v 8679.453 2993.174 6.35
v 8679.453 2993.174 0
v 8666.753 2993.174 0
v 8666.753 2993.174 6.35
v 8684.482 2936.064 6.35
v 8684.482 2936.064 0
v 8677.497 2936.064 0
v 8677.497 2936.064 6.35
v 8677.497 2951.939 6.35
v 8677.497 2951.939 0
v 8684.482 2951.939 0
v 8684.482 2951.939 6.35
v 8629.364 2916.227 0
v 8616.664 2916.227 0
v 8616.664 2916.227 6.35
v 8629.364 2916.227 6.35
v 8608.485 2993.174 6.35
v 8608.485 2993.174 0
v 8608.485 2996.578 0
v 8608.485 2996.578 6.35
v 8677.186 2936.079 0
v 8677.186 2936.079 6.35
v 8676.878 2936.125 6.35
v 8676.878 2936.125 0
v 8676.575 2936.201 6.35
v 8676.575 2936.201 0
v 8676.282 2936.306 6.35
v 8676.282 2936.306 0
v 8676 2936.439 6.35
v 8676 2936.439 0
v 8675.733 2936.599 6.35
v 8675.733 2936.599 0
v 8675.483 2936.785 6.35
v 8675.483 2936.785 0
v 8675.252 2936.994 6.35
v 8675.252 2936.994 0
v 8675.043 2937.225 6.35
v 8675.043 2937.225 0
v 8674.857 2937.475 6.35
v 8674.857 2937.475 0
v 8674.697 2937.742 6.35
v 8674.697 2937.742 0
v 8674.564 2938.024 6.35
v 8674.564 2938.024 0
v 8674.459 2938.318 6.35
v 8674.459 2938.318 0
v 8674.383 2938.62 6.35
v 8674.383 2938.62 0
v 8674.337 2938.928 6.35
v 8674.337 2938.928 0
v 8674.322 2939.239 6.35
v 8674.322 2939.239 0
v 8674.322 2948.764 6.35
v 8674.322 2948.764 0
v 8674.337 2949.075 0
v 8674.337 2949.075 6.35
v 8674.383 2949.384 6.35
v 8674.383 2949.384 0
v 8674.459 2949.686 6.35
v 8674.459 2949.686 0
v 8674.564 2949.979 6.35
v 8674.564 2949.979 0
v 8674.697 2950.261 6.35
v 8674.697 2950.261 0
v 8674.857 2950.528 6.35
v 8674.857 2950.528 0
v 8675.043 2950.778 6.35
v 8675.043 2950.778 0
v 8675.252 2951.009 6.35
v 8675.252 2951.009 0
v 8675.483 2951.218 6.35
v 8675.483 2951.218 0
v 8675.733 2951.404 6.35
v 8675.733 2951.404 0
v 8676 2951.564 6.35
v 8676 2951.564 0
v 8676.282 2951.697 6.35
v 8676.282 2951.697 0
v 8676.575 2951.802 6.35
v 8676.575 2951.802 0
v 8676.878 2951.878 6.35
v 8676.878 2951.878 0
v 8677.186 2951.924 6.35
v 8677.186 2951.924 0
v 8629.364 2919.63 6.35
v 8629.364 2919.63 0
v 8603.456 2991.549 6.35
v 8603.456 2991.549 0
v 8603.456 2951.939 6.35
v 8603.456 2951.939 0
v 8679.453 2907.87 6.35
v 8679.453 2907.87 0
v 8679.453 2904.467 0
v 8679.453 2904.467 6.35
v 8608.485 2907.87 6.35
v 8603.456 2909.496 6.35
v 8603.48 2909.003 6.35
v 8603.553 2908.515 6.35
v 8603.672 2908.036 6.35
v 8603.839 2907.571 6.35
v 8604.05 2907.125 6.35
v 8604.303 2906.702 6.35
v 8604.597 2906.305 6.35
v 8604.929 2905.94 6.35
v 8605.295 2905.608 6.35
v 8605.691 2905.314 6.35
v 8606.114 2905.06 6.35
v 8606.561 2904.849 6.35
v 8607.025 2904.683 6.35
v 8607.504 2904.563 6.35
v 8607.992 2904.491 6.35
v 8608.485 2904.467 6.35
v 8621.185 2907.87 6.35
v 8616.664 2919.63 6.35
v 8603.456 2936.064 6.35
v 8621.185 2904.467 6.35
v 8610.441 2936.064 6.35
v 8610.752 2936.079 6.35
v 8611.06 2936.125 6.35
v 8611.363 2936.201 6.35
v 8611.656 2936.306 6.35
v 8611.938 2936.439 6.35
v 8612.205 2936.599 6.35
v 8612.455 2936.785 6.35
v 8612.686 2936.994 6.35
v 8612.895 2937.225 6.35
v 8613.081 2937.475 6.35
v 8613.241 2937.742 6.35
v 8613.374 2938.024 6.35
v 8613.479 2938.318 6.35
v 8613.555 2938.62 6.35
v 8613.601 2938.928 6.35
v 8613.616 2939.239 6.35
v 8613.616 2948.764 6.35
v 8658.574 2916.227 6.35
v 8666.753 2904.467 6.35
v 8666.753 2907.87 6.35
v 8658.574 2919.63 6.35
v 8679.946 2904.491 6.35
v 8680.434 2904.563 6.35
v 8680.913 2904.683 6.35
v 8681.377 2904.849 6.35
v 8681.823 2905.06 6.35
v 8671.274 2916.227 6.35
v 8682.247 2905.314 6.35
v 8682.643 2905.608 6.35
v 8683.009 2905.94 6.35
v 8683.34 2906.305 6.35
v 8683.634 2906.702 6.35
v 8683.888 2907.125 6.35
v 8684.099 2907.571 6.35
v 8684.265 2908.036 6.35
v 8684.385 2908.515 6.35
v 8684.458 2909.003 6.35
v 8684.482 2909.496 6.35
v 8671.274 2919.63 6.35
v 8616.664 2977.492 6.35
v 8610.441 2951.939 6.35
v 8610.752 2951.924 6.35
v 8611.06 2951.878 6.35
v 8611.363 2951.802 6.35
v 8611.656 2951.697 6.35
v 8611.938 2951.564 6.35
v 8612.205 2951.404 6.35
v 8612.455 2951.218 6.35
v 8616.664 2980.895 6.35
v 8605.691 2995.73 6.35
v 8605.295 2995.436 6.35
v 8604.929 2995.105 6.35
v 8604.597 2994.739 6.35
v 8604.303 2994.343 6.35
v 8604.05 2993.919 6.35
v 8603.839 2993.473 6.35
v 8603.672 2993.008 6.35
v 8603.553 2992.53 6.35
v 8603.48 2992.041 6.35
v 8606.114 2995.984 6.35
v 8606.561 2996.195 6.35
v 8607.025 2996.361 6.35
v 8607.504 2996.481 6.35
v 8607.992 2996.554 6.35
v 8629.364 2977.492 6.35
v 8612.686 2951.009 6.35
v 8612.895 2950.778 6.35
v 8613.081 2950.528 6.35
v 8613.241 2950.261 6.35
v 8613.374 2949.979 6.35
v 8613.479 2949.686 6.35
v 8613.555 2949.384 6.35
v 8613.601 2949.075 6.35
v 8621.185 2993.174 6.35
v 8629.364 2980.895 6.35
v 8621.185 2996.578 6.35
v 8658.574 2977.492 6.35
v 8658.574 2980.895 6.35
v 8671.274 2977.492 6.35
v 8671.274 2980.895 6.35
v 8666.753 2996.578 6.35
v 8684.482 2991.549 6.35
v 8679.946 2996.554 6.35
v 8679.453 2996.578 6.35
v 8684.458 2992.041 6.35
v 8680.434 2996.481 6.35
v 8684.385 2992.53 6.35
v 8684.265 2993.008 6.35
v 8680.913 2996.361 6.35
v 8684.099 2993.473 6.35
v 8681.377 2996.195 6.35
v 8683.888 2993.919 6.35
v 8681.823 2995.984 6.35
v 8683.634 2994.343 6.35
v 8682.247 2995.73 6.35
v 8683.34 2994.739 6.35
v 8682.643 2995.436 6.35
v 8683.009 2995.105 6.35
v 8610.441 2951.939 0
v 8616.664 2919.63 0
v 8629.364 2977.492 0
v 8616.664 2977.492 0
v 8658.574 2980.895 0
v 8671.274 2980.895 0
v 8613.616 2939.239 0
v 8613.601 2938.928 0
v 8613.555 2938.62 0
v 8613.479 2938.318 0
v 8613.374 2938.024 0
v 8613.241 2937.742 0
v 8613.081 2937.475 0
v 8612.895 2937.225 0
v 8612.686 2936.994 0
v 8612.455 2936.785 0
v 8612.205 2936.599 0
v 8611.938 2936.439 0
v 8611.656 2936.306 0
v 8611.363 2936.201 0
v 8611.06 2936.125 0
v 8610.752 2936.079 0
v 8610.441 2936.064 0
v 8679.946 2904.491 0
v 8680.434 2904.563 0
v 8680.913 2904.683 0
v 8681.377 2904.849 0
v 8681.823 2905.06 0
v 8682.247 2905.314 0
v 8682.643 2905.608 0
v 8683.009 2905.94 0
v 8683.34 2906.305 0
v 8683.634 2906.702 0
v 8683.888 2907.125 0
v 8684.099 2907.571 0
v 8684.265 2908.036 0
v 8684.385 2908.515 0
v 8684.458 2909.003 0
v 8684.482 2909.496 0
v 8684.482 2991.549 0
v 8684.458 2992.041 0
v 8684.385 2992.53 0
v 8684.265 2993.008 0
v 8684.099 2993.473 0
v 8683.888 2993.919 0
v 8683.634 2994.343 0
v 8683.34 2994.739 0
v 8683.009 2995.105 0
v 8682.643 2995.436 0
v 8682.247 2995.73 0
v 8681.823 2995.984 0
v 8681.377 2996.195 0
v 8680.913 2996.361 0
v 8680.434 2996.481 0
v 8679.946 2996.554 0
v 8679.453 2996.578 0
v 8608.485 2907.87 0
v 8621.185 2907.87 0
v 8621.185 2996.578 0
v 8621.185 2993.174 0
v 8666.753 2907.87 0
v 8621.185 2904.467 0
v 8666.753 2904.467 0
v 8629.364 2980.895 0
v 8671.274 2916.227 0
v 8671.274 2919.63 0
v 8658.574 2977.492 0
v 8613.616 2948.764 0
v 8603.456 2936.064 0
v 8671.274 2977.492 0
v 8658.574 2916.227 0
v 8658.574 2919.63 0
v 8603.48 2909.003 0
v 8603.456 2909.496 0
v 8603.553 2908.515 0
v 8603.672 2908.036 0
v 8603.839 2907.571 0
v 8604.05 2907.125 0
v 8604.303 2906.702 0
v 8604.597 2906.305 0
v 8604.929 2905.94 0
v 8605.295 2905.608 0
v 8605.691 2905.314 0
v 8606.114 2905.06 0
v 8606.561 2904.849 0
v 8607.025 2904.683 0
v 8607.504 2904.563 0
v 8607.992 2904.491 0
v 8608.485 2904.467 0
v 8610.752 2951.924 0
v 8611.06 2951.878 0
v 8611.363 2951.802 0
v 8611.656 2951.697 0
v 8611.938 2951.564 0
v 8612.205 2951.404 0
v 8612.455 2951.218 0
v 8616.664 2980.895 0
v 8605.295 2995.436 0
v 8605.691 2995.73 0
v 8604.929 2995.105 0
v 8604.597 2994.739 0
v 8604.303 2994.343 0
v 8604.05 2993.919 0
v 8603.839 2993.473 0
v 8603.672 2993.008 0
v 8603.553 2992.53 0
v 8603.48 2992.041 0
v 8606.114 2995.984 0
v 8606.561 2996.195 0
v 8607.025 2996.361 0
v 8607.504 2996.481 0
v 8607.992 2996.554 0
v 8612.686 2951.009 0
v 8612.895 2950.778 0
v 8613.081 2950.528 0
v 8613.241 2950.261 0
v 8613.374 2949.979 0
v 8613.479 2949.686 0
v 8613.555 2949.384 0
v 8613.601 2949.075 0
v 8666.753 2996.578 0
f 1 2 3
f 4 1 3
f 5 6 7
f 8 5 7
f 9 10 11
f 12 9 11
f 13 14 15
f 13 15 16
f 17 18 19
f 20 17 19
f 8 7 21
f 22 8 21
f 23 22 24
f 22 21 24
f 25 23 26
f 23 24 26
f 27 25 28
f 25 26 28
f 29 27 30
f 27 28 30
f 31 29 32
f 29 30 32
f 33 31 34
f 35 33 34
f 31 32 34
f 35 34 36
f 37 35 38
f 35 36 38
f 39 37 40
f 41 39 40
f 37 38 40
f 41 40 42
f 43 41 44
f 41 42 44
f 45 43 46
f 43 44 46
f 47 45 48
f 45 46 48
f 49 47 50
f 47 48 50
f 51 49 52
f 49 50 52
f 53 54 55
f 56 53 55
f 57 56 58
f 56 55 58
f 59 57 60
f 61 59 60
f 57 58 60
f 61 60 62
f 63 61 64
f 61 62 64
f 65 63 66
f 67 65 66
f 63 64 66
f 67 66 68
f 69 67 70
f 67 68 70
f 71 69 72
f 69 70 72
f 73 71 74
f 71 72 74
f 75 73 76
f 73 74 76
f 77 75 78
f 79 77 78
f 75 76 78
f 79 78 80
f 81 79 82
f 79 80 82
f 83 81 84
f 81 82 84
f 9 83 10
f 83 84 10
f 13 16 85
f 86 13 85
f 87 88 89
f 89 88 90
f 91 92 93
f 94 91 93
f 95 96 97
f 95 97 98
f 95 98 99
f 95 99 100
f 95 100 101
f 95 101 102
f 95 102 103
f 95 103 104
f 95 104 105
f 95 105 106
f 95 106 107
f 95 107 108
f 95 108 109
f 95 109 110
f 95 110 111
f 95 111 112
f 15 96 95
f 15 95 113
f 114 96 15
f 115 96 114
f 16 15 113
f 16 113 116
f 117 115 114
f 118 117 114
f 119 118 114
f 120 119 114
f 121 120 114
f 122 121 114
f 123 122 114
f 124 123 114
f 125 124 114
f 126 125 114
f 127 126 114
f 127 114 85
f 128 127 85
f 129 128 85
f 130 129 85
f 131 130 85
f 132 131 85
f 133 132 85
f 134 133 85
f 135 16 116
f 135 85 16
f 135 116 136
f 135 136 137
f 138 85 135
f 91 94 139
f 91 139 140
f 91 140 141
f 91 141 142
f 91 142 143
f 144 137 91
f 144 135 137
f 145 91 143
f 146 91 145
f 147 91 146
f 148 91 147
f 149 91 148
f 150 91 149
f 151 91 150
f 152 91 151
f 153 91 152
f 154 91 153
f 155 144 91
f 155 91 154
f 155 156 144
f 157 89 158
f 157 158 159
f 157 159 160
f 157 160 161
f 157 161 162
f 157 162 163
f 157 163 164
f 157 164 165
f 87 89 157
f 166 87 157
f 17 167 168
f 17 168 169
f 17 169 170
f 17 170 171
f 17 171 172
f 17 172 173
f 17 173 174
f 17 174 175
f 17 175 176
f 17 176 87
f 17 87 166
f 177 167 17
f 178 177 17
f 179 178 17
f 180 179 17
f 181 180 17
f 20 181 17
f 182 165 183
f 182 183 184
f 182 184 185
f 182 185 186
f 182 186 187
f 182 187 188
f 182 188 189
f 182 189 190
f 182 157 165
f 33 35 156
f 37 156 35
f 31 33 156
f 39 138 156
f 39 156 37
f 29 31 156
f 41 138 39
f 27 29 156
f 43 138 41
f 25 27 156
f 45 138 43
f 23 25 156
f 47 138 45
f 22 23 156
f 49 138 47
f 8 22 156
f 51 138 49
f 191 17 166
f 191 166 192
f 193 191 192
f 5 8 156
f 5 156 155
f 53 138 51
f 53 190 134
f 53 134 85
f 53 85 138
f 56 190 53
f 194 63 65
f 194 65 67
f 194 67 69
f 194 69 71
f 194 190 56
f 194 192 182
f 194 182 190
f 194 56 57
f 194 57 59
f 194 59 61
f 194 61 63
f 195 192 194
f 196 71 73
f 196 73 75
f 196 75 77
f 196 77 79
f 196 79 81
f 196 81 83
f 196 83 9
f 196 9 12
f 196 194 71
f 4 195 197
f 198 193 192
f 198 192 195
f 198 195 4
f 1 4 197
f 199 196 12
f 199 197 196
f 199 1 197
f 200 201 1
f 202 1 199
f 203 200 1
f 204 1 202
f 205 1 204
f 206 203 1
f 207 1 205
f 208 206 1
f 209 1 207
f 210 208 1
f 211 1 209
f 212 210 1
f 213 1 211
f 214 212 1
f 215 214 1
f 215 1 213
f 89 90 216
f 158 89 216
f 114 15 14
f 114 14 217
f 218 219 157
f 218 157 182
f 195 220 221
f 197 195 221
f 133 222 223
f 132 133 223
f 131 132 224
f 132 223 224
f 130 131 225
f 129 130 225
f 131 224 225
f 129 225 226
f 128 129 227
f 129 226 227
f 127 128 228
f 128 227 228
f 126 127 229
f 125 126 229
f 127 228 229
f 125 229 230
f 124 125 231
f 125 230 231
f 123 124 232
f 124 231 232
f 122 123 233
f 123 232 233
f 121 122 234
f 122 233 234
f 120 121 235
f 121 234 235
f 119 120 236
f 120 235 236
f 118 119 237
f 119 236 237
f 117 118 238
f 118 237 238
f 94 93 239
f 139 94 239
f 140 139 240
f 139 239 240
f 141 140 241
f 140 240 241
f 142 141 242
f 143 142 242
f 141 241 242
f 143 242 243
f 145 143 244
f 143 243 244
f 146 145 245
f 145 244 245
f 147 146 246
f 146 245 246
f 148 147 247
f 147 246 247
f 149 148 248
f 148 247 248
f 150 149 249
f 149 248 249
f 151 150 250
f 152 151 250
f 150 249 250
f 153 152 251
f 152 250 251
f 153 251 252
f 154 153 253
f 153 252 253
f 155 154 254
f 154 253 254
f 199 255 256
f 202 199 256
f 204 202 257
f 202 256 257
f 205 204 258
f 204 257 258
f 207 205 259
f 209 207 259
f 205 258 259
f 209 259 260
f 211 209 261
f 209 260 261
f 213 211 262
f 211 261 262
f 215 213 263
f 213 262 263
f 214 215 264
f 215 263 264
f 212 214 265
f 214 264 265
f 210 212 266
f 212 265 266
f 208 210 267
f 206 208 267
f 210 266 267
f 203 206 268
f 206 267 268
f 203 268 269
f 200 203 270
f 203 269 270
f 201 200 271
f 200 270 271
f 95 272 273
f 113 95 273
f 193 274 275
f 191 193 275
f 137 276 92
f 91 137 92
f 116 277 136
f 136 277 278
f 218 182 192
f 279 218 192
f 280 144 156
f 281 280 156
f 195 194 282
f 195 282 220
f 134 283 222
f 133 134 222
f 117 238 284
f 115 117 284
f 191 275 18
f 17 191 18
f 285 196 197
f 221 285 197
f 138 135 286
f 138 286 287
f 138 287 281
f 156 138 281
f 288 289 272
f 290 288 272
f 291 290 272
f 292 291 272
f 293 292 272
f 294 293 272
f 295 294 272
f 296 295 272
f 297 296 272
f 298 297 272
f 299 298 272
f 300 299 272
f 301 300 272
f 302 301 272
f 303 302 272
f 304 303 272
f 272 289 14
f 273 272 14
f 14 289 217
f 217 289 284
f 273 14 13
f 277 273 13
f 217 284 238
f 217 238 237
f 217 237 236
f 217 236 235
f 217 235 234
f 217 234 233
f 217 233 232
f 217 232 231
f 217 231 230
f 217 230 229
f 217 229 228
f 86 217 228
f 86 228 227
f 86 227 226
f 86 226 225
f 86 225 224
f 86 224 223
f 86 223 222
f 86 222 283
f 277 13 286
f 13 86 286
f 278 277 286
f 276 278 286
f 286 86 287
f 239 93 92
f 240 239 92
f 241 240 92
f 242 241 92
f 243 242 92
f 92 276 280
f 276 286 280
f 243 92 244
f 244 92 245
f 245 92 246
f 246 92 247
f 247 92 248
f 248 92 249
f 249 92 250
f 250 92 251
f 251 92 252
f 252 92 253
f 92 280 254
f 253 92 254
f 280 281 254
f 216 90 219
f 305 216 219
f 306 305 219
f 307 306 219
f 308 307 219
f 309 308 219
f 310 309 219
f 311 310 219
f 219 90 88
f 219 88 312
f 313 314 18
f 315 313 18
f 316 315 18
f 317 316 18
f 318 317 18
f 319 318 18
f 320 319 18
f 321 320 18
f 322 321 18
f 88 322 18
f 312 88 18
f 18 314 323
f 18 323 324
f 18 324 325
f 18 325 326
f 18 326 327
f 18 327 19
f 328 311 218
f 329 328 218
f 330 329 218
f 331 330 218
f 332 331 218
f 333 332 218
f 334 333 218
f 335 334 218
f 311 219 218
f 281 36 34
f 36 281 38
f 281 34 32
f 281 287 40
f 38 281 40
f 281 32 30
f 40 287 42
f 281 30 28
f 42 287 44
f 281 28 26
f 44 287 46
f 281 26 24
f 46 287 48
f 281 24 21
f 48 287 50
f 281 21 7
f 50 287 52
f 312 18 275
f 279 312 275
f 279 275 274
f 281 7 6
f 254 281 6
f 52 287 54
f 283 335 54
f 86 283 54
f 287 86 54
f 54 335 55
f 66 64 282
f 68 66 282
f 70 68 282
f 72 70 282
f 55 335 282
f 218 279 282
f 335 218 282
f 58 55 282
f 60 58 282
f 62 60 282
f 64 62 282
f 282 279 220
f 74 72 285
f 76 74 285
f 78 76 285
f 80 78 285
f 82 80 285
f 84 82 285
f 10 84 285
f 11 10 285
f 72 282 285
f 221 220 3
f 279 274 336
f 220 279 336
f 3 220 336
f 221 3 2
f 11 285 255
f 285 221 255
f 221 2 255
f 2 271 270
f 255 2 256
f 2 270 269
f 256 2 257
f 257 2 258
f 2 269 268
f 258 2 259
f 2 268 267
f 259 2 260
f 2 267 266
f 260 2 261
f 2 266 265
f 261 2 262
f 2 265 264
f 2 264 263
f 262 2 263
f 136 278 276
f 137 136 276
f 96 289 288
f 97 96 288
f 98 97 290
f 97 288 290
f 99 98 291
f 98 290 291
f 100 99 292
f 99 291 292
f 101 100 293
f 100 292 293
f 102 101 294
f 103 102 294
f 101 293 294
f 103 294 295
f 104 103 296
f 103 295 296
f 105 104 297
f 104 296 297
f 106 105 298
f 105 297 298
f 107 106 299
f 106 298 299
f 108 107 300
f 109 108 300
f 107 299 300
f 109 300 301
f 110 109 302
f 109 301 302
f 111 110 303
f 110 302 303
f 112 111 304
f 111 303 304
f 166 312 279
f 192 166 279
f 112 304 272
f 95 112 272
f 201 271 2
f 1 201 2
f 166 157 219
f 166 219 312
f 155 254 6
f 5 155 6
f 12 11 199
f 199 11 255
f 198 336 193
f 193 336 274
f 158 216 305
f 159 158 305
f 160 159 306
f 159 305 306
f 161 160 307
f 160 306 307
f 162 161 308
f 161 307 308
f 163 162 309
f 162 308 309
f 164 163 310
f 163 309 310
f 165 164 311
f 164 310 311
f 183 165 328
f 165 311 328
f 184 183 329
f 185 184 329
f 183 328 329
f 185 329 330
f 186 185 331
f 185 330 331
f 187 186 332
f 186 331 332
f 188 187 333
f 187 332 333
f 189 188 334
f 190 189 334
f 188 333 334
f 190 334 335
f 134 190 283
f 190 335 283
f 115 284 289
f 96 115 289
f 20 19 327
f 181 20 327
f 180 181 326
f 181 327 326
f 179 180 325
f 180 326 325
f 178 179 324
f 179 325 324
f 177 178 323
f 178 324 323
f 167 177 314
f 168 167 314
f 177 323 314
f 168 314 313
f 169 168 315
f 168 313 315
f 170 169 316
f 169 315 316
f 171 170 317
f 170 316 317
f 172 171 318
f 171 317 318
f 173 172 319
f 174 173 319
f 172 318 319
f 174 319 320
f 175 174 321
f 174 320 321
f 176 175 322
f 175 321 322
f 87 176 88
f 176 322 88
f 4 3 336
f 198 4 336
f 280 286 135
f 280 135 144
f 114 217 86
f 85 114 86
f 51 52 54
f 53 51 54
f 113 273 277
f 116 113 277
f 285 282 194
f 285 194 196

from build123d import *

# Parameters (mm, degrees)
SKETCH1_W           = 12.7
SKETCH1_H           = 3.4036
BOSS_EXTRUDE1_DEPTH = 6.35


with BuildPart() as part:
    # Sketch1 → Boss-Extrude1 (new body)
    with BuildSketch(Plane.XY):
        with BuildLine():
            Line((8603.455921527, 2991.548549024), (8603.455921527, 2951.939177286))
            Line((8603.455921527, 2951.939177286), (8610.440921527, 2951.939177286))
            ThreePointArc((8610.440921527, 2951.939177286), (8612.685985557, 2951.009241316), (8613.615921527, 2948.764177286))
            Line((8613.615921527, 2948.764177286), (8613.615921527, 2939.239177286))
            ThreePointArc((8613.615921527, 2939.239177286), (8612.685985557, 2936.994113255), (8610.440921527, 2936.064177286))
            Line((8610.440921527, 2936.064177286), (8603.455921527, 2936.064177286))
            Line((8603.455921527, 2936.064177286), (8603.455921527, 2909.495777286))
            ThreePointArc((8603.455921527, 2909.495777286), (8604.928940103, 2905.939595862), (8608.485121527, 2904.466577286))
            Line((8608.485121527, 2904.466577286), (8608.485121527, 2907.870177286))
            Line((8608.485121527, 2907.870177286), (8621.185121527, 2907.870177286))
            Line((8621.185121527, 2907.870177286), (8621.185121527, 2904.466577286))
            Line((8621.185121527, 2904.466577286), (8666.752721527, 2904.466577286))
            Line((8666.752721527, 2904.466577286), (8666.752721527, 2907.870177286))
            Line((8666.752721527, 2907.870177286), (8679.452721527, 2907.870177286))
            Line((8679.452721527, 2907.870177286), (8679.452721527, 2904.466577286))
            ThreePointArc((8679.452721527, 2904.466577286), (8683.008902951, 2905.939595862), (8684.481921527, 2909.495777286))
            Line((8684.481921527, 2909.495777286), (8684.481921527, 2936.064177286))
            Line((8684.481921527, 2936.064177286), (8677.496921527, 2936.064177286))
            ThreePointArc((8677.496921527, 2936.064177286), (8675.251857497, 2936.994113255), (8674.321921527, 2939.239177286))
            Line((8674.321921527, 2939.239177286), (8674.321921527, 2948.764177286))
            ThreePointArc((8674.321921527, 2948.764177286), (8675.251857497, 2951.009241316), (8677.496921527, 2951.939177286))
            Line((8677.496921527, 2951.939177286), (8684.481921527, 2951.939177286))
            Line((8684.481921527, 2951.939177286), (8684.481921527, 2991.548549024))
            ThreePointArc((8684.481921527, 2991.548549024), (8683.008902951, 2995.104730448), (8679.452721527, 2996.577749024))
            Line((8679.452721527, 2996.577749024), (8679.452721527, 2993.174149024))
            Line((8679.452721527, 2993.174149024), (8666.752721527, 2993.174149024))
            Line((8666.752721527, 2993.174149024), (8666.752721527, 2996.577749024))
            Line((8666.752721527, 2996.577749024), (8621.185121527, 2996.577749024))
            Line((8621.185121527, 2996.577749024), (8621.185121527, 2993.174149024))
            Line((8621.185121527, 2993.174149024), (8608.485121527, 2993.174149024))
            Line((8608.485121527, 2993.174149024), (8608.485121527, 2996.577749024))
            ThreePointArc((8608.485121527, 2996.577749024), (8604.928940103, 2995.104730448), (8603.455921527, 2991.548549024))
        make_face()
        with Locations((8623.013921527, 2917.928577286)):
            Rectangle(SKETCH1_W, SKETCH1_H, mode=Mode.SUBTRACT)
        with Locations((8664.923921527, 2917.928577286)):
            Rectangle(SKETCH1_W, SKETCH1_H, mode=Mode.SUBTRACT)
        with Locations((8664.923921527, 2979.193377286)):
            Rectangle(SKETCH1_W, SKETCH1_H, mode=Mode.SUBTRACT)
        with Locations((8623.013921527, 2979.193377286)):
            Rectangle(SKETCH1_W, SKETCH1_H, mode=Mode.SUBTRACT)
    extrude(amount=BOSS_EXTRUDE1_DEPTH)


solid = part.part
